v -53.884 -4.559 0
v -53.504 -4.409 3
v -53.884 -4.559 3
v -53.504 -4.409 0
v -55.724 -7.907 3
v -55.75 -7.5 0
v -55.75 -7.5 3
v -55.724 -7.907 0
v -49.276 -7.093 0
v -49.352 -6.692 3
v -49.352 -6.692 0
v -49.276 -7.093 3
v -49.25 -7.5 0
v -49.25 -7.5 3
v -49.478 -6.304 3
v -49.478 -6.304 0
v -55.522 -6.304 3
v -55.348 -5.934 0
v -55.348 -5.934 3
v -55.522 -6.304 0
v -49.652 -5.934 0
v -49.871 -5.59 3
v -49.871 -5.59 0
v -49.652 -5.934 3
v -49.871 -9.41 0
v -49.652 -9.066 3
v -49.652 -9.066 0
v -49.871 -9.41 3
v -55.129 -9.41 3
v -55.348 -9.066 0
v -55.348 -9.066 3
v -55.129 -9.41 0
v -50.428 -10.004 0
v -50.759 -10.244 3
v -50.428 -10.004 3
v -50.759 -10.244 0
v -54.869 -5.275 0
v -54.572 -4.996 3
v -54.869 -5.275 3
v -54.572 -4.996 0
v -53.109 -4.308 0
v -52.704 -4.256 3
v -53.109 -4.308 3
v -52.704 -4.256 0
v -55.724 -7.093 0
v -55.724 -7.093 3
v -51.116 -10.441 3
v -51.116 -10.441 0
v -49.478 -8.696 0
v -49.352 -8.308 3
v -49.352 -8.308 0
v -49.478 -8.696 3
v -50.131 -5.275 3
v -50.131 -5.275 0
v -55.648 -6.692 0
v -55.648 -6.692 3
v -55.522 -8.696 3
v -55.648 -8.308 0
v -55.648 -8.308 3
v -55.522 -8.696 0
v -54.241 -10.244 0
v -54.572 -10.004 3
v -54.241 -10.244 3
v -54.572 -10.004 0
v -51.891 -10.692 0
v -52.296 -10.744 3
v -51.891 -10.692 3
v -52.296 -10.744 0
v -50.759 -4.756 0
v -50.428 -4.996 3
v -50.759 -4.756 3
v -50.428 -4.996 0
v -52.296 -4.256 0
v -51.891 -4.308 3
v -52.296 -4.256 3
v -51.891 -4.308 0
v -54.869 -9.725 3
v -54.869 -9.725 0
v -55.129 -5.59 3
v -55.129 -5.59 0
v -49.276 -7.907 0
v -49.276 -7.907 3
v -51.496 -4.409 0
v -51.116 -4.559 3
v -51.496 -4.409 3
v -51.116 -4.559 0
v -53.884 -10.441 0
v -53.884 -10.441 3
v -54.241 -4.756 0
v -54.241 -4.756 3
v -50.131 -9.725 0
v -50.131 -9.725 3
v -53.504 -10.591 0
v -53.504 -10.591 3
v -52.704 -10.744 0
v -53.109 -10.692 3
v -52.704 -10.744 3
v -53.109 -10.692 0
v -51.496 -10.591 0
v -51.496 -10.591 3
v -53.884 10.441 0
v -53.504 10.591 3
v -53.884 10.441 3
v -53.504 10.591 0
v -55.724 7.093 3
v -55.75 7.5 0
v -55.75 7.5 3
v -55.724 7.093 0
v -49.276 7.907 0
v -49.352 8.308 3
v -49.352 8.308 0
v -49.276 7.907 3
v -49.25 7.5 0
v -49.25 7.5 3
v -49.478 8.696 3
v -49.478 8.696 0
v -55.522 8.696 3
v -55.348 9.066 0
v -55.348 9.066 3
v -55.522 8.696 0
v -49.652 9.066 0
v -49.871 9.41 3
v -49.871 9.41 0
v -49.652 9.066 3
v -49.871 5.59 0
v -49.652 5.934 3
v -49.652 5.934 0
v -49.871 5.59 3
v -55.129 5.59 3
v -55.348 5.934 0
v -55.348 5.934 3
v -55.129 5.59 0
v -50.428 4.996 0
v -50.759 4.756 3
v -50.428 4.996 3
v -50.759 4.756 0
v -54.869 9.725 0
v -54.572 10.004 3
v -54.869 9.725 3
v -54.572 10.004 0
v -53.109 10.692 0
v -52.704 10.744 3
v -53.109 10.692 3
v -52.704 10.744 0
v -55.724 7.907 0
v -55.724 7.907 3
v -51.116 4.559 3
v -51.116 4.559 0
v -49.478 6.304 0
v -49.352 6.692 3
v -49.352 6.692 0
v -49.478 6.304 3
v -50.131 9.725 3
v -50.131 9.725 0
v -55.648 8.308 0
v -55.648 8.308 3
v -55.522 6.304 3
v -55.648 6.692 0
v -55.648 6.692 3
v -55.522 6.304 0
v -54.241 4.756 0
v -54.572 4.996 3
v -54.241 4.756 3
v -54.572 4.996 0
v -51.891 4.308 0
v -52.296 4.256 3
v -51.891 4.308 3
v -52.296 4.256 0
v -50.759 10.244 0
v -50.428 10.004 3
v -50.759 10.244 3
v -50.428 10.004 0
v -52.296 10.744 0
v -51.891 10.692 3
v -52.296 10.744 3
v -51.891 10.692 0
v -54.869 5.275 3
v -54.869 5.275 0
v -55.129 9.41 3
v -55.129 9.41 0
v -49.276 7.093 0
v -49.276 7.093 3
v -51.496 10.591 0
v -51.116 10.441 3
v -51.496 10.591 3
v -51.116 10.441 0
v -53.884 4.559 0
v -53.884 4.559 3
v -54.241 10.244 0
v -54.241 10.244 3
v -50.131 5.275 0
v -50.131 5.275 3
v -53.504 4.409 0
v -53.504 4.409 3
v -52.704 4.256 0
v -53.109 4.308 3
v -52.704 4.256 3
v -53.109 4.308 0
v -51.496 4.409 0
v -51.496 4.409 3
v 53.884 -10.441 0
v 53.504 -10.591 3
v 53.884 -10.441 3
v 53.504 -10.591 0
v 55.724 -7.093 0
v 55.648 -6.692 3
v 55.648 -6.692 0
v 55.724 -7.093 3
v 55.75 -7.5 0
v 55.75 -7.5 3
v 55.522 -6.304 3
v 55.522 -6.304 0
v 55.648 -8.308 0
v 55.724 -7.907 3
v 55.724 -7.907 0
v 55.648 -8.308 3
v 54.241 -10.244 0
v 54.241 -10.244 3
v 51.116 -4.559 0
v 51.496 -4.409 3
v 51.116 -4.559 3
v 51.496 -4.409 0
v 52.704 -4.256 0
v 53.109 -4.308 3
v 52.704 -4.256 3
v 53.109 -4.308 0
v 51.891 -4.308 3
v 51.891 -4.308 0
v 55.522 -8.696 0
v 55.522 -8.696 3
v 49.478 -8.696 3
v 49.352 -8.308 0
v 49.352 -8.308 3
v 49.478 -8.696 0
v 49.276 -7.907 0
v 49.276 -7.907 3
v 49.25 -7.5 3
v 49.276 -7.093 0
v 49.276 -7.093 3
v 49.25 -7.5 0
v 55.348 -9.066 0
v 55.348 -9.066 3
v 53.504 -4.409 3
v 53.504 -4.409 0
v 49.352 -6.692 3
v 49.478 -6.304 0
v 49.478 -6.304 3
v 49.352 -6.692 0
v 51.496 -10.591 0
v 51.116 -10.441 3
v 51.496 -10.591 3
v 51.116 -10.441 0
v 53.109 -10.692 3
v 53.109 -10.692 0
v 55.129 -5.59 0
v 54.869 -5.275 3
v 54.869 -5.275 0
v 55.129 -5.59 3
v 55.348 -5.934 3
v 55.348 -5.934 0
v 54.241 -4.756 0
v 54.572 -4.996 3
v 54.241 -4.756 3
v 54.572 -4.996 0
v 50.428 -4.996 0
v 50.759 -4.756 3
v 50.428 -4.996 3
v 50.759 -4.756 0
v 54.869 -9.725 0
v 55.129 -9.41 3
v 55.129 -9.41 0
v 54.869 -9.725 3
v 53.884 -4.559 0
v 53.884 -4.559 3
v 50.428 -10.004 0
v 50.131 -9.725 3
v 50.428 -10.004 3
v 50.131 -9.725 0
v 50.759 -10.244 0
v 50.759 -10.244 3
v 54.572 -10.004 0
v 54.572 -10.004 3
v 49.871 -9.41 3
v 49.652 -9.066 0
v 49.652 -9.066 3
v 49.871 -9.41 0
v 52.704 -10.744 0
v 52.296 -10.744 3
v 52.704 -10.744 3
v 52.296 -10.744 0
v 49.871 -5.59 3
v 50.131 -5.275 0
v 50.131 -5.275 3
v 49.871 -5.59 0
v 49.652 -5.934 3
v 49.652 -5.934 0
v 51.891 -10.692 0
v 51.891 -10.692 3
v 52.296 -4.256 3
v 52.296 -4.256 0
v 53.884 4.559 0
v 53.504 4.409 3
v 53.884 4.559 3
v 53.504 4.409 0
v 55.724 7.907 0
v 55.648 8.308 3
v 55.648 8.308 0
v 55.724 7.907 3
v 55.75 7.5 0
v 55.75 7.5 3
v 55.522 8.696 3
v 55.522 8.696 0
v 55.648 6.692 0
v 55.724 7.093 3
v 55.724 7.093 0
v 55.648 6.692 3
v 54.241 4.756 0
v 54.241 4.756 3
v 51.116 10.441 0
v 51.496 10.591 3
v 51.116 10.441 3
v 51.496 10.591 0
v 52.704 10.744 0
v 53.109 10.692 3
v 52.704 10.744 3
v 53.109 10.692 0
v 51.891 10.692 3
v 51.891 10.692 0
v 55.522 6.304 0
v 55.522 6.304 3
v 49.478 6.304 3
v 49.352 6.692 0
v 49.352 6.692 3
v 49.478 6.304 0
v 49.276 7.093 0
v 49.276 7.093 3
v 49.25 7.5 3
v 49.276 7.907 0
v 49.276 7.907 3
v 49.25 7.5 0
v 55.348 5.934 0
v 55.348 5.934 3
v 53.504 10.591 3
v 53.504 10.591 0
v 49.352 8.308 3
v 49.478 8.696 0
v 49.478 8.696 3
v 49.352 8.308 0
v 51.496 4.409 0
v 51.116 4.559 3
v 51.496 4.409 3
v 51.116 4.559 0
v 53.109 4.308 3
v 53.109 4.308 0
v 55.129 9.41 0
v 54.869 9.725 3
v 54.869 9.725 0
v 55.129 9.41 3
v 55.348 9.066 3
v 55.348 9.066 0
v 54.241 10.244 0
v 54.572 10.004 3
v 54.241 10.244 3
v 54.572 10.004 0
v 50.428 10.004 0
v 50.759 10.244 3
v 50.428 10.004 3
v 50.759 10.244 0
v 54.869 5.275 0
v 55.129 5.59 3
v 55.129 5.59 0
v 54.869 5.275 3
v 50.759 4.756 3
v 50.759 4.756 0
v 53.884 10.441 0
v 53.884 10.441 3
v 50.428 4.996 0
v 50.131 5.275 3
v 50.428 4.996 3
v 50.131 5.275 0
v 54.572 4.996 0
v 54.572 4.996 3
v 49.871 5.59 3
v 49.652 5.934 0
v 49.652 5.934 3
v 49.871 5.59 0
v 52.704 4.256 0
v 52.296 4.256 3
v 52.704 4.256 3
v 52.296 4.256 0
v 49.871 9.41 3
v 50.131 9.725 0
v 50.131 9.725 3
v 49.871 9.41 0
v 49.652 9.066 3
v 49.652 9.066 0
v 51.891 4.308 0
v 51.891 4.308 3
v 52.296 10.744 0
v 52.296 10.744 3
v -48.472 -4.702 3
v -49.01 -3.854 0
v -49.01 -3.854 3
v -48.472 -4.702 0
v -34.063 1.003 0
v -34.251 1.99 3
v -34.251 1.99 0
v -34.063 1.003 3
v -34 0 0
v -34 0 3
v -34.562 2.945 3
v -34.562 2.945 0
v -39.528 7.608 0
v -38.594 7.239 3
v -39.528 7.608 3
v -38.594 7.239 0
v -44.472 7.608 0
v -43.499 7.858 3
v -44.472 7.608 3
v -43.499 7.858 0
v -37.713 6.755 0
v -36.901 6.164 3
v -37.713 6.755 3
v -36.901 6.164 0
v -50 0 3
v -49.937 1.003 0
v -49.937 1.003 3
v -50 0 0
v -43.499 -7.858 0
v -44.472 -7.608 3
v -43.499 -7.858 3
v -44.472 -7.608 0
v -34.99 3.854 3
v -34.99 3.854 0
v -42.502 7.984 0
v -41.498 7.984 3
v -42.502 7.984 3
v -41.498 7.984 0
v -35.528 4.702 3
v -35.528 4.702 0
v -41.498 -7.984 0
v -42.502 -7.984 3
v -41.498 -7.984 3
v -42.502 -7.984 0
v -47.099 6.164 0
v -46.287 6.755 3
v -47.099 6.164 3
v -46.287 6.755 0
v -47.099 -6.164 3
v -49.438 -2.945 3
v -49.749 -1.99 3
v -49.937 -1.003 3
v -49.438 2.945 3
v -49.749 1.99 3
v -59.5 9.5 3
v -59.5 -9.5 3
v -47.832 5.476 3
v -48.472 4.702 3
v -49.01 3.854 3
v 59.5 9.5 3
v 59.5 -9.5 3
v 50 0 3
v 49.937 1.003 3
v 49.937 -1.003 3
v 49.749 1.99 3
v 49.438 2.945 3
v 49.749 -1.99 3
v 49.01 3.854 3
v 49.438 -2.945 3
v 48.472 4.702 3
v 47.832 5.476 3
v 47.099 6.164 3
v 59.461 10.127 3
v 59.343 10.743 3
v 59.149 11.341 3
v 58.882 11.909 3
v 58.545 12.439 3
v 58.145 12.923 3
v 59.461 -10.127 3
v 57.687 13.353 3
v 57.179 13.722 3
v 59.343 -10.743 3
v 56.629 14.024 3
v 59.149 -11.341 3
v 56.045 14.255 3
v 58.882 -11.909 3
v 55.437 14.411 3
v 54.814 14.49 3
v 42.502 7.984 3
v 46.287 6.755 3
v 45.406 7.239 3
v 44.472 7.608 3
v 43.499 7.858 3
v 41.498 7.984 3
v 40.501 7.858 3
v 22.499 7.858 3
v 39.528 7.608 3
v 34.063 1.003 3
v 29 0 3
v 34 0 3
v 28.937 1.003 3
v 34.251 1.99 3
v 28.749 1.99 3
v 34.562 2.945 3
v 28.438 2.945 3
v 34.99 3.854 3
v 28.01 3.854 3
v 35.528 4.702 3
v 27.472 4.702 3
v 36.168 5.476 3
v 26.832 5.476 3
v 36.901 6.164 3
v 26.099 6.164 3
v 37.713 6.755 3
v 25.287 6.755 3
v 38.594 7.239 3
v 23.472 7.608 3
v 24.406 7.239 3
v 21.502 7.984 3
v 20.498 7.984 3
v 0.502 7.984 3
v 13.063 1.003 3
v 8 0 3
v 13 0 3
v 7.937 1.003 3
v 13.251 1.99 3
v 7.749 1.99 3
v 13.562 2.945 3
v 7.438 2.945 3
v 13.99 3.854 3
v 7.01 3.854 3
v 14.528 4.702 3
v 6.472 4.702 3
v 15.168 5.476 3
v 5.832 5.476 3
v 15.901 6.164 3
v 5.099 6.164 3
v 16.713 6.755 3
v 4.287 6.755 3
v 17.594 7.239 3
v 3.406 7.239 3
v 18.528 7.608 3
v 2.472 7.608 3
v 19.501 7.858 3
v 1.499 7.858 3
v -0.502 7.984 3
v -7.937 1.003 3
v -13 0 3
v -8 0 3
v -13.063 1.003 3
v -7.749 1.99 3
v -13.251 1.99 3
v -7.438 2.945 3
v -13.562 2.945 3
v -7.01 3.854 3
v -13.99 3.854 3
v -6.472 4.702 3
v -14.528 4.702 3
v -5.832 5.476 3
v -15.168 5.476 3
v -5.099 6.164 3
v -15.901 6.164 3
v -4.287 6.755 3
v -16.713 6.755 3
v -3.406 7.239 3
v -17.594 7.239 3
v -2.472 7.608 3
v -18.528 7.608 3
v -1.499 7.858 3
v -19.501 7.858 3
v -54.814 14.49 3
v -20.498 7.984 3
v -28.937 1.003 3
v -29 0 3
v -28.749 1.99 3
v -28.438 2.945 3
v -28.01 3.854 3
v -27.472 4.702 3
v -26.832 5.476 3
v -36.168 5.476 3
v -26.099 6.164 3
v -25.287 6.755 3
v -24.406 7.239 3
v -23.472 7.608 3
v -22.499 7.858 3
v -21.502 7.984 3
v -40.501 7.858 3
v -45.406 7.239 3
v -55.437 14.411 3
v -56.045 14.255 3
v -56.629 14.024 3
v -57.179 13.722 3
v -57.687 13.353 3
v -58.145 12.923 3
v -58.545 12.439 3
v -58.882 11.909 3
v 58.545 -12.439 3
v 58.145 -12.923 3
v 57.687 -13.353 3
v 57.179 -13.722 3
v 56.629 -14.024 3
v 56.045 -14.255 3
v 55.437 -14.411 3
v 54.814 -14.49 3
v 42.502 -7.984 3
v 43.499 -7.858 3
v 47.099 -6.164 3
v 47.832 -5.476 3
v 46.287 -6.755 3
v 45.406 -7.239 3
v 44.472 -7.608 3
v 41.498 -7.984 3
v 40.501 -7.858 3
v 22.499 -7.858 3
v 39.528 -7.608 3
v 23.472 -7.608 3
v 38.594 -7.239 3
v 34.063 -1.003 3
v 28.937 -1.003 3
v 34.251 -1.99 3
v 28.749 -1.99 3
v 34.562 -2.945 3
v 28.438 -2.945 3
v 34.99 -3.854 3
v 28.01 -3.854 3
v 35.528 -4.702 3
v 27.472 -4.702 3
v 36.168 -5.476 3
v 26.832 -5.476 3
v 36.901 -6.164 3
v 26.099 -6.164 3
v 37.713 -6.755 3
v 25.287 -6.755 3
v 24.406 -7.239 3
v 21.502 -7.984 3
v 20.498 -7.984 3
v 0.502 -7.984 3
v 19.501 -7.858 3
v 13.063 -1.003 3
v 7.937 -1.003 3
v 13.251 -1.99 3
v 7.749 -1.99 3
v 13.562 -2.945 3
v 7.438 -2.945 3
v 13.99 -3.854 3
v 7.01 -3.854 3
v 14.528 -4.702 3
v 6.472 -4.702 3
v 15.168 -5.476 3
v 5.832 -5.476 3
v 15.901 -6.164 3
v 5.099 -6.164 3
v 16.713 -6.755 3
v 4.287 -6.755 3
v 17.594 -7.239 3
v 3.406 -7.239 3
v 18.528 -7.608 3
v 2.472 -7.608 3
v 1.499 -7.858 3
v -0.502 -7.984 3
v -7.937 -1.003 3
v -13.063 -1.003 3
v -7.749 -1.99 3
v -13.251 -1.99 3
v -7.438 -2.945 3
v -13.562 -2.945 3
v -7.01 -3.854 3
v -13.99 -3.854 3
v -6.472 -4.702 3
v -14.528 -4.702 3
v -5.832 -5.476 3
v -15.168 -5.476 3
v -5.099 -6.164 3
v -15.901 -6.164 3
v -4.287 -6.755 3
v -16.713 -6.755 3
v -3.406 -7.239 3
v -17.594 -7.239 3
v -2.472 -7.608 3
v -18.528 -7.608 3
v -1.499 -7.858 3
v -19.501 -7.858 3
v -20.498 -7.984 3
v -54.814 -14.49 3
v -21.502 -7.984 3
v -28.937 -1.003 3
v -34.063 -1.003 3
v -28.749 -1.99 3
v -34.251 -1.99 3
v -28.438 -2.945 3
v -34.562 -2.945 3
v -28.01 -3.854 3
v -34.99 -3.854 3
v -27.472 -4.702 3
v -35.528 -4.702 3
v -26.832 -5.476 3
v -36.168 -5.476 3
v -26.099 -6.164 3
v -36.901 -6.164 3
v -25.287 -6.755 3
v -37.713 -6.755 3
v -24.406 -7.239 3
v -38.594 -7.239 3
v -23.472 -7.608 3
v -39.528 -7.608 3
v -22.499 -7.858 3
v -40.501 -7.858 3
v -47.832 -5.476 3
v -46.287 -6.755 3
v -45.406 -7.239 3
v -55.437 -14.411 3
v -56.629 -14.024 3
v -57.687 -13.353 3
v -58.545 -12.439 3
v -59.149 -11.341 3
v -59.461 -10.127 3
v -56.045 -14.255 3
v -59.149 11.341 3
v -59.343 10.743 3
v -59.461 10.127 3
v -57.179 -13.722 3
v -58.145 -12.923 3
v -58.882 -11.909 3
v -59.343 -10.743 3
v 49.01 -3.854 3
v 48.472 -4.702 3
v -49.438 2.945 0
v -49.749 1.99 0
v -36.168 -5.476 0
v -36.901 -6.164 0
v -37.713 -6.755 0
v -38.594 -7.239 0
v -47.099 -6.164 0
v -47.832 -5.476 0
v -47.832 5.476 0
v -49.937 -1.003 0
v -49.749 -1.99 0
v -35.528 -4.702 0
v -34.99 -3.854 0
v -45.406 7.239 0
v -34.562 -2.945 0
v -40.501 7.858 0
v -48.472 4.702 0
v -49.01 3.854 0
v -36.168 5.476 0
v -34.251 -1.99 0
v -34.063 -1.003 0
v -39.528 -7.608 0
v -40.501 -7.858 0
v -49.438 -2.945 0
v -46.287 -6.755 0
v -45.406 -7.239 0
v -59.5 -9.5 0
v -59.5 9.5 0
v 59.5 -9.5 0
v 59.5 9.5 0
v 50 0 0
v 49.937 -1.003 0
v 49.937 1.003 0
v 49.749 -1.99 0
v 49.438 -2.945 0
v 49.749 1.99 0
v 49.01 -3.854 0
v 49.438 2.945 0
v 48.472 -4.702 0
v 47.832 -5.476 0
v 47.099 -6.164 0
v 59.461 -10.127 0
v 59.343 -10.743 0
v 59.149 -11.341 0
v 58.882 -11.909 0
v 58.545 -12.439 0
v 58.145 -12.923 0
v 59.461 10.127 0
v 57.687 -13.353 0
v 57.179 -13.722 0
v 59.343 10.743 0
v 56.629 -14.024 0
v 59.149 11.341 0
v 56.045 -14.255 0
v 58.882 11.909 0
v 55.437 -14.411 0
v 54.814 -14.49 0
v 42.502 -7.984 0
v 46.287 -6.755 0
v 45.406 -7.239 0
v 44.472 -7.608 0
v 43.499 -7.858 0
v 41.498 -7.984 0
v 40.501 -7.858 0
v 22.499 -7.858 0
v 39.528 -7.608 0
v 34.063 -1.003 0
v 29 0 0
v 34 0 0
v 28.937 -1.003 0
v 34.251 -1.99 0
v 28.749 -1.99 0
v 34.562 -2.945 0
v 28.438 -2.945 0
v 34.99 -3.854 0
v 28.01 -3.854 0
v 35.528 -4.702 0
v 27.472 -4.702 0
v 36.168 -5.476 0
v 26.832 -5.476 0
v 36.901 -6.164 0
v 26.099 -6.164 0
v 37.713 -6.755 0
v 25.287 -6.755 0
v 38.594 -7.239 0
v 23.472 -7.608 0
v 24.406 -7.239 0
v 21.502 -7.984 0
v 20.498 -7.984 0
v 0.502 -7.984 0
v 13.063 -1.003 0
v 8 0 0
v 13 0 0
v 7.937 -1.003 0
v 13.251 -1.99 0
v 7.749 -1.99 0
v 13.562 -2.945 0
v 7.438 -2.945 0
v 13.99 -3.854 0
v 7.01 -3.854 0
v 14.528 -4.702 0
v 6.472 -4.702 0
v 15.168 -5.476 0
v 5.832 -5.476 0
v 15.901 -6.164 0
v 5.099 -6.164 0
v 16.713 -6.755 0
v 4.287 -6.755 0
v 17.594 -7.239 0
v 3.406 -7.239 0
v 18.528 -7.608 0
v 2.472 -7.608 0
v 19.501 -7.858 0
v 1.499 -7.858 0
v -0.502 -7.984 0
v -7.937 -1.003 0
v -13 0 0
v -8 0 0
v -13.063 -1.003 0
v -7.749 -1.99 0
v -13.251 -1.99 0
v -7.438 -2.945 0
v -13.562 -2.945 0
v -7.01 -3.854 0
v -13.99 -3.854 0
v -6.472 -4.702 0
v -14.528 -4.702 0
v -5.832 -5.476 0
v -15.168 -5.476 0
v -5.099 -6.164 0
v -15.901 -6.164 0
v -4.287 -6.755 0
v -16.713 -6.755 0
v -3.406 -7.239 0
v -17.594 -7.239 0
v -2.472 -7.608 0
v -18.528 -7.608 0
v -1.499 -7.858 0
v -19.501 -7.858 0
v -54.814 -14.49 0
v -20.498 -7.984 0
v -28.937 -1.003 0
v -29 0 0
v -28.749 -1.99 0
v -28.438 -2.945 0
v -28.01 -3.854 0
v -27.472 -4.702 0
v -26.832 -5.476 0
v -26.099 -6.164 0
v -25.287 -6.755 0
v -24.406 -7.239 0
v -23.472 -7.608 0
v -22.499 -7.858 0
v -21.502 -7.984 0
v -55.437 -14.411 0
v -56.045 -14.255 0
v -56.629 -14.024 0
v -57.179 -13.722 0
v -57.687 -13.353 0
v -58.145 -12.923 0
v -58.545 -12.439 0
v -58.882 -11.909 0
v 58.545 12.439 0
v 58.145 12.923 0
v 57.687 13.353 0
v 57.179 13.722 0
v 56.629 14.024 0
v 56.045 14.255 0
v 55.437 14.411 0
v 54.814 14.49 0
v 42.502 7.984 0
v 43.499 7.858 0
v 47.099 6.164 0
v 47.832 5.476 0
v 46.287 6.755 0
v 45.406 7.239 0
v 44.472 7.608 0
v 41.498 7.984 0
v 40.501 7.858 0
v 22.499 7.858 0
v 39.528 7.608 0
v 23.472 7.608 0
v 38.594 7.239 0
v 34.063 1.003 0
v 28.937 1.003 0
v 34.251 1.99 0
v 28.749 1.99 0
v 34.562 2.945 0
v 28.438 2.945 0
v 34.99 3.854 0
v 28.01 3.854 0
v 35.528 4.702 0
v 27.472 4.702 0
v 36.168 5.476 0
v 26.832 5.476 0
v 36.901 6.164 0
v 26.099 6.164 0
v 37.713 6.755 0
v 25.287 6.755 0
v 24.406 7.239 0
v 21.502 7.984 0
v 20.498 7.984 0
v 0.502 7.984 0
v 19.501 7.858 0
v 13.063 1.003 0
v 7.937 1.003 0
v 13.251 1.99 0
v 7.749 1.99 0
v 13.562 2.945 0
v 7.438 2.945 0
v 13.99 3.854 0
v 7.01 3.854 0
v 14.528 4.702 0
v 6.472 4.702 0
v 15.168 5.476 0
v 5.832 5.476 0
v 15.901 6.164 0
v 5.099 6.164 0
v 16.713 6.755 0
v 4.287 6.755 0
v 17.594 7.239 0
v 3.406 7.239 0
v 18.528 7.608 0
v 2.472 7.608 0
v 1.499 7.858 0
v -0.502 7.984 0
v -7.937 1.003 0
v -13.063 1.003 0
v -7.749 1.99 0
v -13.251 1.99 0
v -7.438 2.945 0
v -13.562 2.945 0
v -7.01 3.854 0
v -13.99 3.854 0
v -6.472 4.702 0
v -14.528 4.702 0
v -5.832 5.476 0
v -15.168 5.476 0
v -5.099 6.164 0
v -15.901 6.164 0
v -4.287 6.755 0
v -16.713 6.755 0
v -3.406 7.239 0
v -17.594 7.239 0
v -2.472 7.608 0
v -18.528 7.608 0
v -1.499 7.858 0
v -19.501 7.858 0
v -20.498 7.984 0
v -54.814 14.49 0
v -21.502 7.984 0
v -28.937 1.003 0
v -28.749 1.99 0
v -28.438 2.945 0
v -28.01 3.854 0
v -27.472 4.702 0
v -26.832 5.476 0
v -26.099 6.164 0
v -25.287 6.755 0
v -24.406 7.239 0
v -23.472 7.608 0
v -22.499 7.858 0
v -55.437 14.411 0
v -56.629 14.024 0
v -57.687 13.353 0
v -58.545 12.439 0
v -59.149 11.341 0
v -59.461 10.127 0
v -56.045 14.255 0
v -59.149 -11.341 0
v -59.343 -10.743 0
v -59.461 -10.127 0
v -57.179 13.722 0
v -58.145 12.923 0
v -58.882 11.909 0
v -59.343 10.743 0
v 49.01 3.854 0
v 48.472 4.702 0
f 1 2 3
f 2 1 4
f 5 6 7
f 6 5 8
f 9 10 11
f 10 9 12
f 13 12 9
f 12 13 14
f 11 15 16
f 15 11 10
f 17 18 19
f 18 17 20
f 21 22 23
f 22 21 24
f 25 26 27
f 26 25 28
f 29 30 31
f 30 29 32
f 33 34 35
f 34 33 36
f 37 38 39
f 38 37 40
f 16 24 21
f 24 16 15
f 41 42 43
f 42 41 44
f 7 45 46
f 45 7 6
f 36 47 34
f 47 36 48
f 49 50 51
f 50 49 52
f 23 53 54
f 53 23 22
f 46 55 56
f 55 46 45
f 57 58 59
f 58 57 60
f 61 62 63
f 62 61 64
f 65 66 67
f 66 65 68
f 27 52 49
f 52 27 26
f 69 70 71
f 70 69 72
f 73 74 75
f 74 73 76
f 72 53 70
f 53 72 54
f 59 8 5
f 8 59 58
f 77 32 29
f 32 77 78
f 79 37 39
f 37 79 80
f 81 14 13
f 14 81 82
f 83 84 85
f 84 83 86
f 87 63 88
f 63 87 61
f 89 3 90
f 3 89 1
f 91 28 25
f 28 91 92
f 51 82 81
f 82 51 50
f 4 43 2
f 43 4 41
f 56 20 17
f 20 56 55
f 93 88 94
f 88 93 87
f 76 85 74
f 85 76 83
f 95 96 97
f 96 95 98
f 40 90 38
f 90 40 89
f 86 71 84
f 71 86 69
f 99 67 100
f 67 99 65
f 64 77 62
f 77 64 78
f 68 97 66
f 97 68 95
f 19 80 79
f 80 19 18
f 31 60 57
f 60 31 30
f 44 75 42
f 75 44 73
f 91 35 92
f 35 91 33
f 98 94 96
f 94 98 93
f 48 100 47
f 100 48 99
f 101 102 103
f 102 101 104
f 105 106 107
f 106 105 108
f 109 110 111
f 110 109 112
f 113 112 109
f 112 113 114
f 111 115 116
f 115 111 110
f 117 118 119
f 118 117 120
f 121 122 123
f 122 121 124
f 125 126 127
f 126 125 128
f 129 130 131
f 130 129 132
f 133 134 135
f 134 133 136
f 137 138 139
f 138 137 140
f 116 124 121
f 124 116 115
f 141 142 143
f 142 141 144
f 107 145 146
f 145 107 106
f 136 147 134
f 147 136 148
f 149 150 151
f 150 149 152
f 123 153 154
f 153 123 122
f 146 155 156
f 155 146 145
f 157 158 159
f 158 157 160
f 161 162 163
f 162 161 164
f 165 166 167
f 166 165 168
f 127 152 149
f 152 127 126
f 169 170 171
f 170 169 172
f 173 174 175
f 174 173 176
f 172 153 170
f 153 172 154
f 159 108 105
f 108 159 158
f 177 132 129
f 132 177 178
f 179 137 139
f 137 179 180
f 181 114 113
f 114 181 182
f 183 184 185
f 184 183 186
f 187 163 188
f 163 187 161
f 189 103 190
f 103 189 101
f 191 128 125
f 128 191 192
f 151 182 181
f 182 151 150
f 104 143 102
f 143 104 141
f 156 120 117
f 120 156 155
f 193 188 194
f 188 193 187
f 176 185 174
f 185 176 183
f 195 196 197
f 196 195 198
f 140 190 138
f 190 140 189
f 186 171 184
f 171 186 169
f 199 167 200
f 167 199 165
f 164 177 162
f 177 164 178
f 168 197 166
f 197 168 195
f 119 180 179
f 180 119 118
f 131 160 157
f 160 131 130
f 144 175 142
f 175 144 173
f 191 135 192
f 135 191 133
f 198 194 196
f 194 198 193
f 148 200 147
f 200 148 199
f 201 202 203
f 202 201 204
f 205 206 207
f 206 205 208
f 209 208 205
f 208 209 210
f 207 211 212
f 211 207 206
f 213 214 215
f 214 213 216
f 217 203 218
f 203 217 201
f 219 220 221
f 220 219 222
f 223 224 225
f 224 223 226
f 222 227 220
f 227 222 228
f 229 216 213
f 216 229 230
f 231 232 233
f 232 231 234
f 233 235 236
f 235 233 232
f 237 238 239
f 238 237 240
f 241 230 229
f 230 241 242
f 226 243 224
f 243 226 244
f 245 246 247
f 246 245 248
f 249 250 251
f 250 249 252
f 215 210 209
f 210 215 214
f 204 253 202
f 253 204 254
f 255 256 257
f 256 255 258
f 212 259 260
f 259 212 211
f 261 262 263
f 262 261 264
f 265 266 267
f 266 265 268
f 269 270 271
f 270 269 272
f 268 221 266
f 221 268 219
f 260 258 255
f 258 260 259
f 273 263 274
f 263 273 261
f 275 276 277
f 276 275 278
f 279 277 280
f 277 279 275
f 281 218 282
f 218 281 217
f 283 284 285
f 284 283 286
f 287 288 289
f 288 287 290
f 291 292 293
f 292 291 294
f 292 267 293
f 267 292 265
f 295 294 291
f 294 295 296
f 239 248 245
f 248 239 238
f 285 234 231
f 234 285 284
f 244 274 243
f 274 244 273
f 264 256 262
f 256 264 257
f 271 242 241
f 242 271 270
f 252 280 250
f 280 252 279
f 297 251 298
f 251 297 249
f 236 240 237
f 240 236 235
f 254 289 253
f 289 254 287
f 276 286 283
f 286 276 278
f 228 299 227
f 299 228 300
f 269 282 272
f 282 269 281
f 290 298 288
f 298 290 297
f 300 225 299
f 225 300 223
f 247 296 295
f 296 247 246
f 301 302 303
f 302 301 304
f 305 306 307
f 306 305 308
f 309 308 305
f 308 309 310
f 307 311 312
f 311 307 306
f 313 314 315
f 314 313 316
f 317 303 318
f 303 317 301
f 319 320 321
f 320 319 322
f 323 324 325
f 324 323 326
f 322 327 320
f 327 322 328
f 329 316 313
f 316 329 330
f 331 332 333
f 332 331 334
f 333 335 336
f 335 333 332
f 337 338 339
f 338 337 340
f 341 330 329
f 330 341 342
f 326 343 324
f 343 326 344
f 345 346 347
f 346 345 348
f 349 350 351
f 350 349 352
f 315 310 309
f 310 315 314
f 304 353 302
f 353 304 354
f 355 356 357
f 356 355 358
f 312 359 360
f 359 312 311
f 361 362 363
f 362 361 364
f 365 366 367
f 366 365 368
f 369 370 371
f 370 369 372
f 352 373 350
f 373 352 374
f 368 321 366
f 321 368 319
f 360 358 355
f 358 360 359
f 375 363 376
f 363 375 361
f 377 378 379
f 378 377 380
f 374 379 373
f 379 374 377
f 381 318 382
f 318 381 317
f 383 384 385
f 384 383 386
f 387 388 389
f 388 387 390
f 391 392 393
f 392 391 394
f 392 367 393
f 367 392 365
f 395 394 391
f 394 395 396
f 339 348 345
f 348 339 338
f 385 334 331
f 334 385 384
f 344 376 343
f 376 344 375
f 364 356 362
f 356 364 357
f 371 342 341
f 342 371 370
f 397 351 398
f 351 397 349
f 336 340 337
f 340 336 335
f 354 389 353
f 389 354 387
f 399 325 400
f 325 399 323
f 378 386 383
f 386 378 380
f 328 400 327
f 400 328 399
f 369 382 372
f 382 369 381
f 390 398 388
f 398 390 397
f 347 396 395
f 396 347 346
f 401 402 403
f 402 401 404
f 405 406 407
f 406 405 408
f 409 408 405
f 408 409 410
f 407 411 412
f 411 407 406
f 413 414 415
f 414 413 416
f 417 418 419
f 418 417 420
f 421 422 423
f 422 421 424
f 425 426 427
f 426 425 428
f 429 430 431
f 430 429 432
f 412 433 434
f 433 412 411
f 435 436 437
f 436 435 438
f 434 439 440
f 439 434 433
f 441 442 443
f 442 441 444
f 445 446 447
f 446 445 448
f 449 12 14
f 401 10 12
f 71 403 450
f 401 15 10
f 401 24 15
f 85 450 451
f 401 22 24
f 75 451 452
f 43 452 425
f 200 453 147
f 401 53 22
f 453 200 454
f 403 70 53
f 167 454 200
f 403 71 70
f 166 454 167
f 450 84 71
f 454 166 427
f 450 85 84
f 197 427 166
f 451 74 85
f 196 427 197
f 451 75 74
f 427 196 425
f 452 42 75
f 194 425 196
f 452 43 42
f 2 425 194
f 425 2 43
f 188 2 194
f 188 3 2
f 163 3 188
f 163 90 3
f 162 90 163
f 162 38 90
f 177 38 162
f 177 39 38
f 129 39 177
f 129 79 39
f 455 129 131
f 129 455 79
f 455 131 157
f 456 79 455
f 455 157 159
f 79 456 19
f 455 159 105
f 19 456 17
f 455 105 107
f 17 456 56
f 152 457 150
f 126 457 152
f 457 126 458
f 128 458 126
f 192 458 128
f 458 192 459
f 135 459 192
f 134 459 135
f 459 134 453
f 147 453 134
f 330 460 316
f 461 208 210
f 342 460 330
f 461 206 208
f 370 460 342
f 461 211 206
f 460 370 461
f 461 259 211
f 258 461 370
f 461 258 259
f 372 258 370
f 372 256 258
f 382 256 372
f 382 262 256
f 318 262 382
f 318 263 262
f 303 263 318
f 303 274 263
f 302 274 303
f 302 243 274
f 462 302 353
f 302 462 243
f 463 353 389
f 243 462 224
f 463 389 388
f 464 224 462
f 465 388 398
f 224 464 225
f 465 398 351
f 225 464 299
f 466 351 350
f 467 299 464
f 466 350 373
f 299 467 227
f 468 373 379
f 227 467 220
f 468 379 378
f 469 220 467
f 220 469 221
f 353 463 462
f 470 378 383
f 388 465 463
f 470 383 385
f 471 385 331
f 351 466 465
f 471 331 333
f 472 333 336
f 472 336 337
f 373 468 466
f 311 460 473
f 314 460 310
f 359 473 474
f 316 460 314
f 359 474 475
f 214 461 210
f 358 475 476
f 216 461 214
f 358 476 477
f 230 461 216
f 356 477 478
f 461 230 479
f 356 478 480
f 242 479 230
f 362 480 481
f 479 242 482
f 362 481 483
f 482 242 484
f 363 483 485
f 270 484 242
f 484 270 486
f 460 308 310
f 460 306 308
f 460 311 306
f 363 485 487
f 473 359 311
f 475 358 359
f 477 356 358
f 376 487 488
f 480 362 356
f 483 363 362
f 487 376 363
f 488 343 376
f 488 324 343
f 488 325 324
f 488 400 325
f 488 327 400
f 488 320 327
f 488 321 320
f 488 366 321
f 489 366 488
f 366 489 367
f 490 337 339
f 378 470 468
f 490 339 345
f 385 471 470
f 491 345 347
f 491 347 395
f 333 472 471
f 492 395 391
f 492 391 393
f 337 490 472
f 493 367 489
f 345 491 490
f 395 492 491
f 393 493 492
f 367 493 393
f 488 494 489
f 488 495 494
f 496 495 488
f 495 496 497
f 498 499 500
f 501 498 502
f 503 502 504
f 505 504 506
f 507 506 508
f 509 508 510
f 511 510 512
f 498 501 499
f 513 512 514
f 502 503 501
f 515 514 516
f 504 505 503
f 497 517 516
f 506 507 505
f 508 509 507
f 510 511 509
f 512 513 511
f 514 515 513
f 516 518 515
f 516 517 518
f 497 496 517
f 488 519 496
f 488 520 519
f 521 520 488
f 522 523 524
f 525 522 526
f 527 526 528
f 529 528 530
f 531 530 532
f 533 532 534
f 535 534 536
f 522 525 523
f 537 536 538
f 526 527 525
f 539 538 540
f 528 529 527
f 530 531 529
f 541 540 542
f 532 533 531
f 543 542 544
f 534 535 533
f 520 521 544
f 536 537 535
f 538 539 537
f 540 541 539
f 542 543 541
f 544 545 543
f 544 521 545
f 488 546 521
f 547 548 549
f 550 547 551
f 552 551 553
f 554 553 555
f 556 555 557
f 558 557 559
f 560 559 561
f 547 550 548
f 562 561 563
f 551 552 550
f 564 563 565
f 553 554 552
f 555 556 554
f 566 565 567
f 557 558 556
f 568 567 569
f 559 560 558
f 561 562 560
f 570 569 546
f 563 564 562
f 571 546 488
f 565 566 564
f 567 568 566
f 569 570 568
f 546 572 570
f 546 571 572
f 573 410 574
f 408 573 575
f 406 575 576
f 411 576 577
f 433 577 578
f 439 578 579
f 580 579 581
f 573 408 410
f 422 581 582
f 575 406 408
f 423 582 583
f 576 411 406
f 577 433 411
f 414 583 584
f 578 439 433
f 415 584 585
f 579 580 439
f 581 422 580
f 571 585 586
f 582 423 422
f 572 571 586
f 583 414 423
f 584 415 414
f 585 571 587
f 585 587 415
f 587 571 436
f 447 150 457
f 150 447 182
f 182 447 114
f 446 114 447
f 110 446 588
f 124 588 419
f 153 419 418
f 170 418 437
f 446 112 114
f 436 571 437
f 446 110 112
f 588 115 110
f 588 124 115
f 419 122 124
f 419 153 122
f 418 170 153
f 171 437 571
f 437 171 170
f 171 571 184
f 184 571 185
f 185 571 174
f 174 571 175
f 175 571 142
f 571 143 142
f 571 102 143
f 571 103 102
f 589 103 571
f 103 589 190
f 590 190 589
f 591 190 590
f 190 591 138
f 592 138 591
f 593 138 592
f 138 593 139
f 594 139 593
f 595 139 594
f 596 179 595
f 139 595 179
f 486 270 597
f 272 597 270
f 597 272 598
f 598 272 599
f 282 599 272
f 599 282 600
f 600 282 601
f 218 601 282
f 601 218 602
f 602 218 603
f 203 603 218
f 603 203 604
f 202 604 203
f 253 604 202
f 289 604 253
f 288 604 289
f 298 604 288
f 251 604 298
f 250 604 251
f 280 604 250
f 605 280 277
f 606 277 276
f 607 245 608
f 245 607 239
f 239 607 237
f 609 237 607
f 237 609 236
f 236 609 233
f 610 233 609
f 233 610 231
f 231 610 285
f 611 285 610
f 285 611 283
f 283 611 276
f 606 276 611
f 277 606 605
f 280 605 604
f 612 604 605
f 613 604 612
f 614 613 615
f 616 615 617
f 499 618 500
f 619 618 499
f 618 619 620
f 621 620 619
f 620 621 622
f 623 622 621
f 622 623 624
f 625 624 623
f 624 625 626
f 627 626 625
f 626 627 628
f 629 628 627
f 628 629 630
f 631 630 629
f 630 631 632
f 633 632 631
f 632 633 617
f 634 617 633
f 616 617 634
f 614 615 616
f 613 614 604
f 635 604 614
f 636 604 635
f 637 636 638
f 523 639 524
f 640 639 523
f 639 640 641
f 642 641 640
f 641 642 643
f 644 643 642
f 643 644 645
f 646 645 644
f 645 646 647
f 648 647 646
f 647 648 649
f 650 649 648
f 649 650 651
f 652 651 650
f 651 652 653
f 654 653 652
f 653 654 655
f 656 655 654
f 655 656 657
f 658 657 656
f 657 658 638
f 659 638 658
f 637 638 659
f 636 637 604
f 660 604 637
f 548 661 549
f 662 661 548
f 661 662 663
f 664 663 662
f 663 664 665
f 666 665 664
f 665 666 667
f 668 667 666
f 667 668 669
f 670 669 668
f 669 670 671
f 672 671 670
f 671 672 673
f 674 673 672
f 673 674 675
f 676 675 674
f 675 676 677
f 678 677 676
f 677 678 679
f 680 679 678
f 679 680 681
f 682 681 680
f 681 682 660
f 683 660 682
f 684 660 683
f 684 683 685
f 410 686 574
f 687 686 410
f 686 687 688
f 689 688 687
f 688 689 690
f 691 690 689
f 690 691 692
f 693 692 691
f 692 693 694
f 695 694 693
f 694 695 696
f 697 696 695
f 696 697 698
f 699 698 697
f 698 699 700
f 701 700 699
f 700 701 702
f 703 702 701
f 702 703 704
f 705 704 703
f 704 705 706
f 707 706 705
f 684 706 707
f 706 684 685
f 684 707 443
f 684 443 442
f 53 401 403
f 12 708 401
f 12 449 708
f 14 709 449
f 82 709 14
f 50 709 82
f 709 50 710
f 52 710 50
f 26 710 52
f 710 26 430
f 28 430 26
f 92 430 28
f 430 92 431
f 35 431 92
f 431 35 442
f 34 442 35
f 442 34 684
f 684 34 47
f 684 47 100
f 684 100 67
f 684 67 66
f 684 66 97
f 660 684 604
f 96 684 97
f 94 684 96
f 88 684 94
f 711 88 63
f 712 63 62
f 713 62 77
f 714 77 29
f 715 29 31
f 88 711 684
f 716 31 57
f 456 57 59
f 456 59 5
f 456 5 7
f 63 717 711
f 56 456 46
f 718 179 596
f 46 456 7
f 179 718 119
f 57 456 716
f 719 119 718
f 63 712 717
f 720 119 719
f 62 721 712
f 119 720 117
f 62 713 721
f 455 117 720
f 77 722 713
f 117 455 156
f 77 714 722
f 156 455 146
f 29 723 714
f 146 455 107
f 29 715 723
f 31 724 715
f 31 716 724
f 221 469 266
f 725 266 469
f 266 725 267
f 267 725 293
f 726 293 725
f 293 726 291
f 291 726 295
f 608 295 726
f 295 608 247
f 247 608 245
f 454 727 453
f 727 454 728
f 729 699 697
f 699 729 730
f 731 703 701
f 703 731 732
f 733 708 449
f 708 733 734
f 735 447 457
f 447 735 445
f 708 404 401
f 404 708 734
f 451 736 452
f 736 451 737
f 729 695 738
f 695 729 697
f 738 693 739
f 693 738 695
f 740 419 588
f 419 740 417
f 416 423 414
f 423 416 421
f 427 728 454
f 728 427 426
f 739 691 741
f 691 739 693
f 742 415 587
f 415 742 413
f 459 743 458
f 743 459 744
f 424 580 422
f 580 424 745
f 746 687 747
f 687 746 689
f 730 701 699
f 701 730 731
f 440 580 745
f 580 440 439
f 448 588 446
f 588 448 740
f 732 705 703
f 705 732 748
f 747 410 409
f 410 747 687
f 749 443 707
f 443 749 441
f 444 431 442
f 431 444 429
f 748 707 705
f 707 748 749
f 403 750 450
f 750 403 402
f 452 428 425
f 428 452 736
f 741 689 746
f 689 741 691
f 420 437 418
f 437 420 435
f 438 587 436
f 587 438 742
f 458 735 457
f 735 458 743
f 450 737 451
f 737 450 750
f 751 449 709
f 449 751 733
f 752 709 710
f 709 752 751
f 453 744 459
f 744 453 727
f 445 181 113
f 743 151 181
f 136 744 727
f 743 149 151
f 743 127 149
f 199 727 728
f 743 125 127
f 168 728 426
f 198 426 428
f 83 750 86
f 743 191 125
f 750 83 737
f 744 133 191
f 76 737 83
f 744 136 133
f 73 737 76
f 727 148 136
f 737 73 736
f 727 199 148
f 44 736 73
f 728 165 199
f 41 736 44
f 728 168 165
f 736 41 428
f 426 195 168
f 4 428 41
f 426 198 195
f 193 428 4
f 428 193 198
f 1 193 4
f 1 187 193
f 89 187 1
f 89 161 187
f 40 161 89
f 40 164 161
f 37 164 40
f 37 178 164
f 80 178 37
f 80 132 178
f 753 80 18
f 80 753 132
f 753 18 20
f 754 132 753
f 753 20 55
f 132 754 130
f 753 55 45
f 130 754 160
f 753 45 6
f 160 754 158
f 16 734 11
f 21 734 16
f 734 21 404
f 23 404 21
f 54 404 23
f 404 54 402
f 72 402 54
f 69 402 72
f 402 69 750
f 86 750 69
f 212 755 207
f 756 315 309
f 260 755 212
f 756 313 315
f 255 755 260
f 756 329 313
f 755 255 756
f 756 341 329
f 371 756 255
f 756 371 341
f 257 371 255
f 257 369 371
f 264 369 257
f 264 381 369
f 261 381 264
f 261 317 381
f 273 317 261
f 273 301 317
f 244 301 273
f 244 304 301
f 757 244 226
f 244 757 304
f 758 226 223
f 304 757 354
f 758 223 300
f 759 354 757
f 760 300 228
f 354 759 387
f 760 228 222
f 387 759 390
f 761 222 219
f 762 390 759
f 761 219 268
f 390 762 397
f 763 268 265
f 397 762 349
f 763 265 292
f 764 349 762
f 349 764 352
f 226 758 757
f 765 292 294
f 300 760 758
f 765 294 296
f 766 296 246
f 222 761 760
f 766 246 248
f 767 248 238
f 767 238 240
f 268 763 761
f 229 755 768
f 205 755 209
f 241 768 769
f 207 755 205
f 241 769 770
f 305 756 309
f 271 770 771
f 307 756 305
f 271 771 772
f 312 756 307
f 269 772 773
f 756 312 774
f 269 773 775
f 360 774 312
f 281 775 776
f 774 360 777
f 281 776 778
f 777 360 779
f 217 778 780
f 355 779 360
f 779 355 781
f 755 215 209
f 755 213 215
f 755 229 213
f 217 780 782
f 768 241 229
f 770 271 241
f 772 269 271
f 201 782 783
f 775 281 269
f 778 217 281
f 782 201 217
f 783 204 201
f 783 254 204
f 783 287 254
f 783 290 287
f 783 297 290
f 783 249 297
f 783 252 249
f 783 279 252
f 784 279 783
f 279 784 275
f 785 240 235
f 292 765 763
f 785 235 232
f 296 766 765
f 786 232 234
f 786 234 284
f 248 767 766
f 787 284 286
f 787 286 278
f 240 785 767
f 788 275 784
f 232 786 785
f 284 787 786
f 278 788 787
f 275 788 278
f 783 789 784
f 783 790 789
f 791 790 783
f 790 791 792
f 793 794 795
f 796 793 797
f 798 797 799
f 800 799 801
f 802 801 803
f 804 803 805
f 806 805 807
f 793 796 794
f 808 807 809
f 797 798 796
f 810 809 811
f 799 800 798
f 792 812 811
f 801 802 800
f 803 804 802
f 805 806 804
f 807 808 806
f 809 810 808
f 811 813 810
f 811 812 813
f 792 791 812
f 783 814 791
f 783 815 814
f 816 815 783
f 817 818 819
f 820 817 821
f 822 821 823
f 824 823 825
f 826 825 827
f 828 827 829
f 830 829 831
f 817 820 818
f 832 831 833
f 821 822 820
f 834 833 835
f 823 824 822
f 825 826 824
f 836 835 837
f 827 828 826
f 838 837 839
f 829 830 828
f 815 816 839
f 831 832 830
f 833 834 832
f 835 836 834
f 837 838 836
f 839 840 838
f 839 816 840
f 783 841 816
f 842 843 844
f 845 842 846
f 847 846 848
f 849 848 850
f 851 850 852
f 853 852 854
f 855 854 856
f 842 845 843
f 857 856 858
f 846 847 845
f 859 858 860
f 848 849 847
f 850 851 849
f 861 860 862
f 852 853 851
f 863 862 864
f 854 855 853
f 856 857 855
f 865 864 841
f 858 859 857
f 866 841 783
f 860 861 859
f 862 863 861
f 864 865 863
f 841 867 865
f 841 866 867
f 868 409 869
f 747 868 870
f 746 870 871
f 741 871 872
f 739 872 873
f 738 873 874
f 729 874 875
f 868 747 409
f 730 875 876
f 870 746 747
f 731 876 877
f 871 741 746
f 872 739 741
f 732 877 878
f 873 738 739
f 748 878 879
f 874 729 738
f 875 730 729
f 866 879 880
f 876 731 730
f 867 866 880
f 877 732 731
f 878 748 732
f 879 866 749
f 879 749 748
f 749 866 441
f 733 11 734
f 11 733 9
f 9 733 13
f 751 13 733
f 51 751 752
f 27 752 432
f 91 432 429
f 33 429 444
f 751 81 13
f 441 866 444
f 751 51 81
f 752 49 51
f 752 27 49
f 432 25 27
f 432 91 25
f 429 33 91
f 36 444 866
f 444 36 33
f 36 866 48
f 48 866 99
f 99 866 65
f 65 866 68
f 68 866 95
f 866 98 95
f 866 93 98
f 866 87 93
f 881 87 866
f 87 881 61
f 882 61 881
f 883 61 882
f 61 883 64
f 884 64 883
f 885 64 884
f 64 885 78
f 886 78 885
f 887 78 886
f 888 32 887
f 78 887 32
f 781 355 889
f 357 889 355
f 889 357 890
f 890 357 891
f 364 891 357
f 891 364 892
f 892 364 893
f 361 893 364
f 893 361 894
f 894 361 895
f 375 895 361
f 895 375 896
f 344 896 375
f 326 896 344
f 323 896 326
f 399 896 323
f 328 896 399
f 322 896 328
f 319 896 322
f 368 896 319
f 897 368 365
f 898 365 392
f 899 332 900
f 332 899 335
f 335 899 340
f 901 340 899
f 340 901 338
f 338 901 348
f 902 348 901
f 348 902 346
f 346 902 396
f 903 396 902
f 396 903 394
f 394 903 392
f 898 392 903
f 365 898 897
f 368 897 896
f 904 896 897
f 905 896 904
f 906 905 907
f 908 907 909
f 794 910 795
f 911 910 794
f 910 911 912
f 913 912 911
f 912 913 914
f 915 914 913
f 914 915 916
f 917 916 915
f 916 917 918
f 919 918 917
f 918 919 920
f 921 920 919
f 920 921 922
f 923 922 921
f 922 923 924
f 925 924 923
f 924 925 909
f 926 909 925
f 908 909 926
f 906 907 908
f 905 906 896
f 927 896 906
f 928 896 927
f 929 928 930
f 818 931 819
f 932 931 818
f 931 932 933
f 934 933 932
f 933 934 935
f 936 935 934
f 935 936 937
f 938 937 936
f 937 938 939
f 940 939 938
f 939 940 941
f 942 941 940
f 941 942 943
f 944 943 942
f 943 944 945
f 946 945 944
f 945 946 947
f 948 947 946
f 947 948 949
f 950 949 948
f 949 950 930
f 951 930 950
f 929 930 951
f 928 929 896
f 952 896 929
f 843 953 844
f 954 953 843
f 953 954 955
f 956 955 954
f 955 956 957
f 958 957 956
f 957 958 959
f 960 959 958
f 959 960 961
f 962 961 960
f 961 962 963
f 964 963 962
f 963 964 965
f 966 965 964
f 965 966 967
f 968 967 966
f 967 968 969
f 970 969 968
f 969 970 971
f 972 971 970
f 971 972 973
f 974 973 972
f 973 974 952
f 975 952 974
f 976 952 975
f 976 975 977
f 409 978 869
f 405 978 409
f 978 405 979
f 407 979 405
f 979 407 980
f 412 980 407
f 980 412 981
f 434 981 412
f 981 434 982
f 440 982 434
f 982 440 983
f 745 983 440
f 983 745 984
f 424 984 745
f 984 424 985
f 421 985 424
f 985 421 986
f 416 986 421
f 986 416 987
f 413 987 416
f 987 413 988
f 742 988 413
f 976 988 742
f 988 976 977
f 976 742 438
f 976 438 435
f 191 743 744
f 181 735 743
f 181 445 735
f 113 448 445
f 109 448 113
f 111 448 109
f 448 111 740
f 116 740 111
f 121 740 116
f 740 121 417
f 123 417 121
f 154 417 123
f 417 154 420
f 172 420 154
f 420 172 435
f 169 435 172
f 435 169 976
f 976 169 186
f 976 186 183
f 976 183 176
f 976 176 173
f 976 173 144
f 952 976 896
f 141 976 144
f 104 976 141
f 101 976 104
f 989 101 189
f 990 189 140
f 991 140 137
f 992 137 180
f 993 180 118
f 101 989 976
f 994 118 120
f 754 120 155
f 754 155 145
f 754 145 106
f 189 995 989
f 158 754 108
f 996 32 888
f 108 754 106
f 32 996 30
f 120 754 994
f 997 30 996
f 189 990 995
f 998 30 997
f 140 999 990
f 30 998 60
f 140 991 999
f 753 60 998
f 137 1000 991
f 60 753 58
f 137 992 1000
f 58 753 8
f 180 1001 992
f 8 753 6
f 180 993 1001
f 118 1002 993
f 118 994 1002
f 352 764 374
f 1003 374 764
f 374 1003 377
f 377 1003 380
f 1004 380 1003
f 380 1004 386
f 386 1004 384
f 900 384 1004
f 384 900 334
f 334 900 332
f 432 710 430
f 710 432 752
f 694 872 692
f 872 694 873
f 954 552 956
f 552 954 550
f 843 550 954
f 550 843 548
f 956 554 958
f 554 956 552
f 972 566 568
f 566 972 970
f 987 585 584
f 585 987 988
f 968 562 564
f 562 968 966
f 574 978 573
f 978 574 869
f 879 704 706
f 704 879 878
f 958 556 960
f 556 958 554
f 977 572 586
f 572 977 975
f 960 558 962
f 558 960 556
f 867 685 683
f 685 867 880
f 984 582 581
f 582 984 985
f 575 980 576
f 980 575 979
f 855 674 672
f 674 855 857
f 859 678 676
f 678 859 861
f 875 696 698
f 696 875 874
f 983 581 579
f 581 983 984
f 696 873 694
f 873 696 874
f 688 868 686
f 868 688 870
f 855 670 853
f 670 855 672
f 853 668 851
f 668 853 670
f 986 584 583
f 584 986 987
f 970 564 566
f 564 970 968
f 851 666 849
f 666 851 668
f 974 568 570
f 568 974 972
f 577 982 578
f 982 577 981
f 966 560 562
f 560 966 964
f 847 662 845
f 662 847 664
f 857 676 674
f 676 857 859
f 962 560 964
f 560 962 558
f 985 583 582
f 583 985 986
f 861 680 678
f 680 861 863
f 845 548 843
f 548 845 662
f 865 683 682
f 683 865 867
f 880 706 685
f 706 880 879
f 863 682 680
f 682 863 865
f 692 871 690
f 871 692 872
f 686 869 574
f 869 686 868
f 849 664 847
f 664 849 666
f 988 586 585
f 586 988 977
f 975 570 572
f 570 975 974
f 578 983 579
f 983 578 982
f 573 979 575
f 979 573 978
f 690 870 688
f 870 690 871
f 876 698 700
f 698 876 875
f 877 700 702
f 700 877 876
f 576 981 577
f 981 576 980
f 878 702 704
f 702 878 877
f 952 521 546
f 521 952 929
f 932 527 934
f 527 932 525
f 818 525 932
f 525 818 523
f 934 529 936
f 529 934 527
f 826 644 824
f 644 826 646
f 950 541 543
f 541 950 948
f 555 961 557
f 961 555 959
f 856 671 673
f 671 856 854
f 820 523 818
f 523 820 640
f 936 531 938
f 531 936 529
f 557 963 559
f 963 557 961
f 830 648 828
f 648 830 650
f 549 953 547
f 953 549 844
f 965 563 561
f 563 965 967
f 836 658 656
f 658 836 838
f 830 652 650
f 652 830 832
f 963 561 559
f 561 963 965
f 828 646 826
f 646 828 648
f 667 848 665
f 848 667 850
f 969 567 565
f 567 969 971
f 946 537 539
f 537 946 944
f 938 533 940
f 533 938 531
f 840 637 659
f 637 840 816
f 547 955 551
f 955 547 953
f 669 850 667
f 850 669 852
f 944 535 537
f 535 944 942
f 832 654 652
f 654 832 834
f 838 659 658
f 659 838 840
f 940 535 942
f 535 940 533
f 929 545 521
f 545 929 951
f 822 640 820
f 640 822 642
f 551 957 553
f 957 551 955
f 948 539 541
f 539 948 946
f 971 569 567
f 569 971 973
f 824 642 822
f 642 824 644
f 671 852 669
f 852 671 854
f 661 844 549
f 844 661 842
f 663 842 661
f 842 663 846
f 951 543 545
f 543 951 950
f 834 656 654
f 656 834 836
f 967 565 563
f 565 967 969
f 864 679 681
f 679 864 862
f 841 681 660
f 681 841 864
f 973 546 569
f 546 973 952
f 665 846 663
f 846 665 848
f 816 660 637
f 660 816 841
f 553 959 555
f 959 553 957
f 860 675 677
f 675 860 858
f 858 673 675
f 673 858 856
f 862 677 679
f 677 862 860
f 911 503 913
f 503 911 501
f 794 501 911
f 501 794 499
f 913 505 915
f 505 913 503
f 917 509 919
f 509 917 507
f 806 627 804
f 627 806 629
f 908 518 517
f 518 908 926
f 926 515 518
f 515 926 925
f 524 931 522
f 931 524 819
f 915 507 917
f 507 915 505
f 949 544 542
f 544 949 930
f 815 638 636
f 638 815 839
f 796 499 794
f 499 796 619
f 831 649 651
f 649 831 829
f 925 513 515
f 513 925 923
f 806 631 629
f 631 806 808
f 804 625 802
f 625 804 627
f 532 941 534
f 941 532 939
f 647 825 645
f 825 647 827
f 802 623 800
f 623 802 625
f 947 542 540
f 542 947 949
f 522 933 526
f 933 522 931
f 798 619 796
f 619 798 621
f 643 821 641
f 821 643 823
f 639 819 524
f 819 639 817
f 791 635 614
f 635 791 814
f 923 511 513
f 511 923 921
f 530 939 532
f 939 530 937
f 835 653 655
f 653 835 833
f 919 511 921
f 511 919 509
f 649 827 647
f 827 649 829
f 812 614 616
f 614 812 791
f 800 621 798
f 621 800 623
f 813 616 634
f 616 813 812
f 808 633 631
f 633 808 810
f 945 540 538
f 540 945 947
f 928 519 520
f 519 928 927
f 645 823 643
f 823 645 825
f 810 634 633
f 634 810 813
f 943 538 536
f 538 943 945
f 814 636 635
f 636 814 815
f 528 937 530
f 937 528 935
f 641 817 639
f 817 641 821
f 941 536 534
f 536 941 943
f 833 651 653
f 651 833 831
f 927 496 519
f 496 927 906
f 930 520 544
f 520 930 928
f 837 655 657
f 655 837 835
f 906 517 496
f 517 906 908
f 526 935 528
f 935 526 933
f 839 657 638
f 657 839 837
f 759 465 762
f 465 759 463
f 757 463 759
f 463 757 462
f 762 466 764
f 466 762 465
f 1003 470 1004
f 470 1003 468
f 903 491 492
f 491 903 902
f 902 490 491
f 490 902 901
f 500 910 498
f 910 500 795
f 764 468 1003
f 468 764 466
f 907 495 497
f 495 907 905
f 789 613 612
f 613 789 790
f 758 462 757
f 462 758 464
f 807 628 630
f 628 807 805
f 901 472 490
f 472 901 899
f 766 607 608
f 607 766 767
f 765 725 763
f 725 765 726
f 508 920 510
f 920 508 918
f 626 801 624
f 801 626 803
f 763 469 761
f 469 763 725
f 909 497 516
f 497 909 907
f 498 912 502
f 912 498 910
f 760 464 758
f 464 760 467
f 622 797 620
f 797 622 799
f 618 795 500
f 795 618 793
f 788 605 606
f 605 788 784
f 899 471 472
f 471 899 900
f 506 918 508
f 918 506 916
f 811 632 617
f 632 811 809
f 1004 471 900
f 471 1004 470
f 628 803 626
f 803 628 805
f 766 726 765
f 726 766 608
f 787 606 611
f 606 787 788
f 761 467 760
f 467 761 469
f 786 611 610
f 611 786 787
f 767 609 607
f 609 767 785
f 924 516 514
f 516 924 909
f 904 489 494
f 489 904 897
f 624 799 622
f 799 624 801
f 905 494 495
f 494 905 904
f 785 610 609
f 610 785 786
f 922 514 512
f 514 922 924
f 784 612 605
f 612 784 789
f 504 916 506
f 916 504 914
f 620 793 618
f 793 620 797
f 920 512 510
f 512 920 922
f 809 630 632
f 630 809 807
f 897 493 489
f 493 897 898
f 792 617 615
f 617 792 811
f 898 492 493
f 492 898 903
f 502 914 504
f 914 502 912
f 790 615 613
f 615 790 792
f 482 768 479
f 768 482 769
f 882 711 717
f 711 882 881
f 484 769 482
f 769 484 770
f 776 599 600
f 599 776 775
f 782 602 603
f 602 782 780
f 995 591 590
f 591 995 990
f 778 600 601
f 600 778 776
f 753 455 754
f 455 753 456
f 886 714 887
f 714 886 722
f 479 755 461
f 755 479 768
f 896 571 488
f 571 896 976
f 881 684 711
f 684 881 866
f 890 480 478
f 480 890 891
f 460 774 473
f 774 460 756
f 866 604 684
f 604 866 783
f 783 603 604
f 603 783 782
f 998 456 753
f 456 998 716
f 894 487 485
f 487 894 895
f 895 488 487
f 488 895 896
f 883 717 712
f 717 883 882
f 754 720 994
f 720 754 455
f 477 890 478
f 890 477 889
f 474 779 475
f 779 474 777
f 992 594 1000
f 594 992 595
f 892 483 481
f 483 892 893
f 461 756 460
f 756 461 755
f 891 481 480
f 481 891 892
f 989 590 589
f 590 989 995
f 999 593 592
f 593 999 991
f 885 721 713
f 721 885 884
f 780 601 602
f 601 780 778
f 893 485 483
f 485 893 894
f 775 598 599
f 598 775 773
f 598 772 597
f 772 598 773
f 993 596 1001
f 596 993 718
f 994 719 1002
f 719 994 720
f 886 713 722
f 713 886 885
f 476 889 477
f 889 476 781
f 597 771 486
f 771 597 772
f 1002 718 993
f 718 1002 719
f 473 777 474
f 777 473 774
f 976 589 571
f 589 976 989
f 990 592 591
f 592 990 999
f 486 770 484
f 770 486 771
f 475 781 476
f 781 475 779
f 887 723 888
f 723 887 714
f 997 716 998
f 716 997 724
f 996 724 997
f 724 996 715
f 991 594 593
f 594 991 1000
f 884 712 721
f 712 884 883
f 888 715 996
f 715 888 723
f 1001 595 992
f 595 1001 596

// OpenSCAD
$fn = 50;

difference() {
	union() {
		hull() {
			translate(v = [-54.5, 9.5, 0]) {
				cylinder(h = 3, r = 5);
			}
			translate(v = [54.5, 9.5, 0]) {
				cylinder(h = 3, r = 5);
			}
			translate(v = [-54.5, -9.5, 0]) {
				cylinder(h = 3, r = 5);
			}
			translate(v = [54.5, -9.5, 0]) {
				cylinder(h = 3, r = 5);
			}
		}
	}
	union() {
		translate(v = [-52.5, -7.5, -100.0]) {
			cylinder(h = 200, r = 3.25);
		}
		translate(v = [-52.5, 7.5, -100.0]) {
			cylinder(h = 200, r = 3.25);
		}
		translate(v = [52.5, -7.5, -100.0]) {
			cylinder(h = 200, r = 3.25);
		}
		translate(v = [52.5, 7.5, -100.0]) {
			cylinder(h = 200, r = 3.25);
		}
		translate(v = [-52.5, -7.5, -100.0]) {
			cylinder(h = 200, r = 1.8);
		}
		translate(v = [-52.5, 7.5, -100.0]) {
			cylinder(h = 200, r = 1.8);
		}
		translate(v = [52.5, -7.5, -100.0]) {
			cylinder(h = 200, r = 1.8);
		}
		translate(v = [52.5, 7.5, -100.0]) {
			cylinder(h = 200, r = 1.8);
		}
		translate(v = [-42.0, 0, 0.0]) {
			cylinder(h = 3, r = 8.0);
		}
		translate(v = [-21.0, 0, 0.0]) {
			cylinder(h = 3, r = 8.0);
		}
		cylinder(h = 3, r = 8.0);
		translate(v = [21.0, 0, 0.0]) {
			cylinder(h = 3, r = 8.0);
		}
		translate(v = [42.0, 0, 0.0]) {
			cylinder(h = 3, r = 8.0);
		}
	}
}
